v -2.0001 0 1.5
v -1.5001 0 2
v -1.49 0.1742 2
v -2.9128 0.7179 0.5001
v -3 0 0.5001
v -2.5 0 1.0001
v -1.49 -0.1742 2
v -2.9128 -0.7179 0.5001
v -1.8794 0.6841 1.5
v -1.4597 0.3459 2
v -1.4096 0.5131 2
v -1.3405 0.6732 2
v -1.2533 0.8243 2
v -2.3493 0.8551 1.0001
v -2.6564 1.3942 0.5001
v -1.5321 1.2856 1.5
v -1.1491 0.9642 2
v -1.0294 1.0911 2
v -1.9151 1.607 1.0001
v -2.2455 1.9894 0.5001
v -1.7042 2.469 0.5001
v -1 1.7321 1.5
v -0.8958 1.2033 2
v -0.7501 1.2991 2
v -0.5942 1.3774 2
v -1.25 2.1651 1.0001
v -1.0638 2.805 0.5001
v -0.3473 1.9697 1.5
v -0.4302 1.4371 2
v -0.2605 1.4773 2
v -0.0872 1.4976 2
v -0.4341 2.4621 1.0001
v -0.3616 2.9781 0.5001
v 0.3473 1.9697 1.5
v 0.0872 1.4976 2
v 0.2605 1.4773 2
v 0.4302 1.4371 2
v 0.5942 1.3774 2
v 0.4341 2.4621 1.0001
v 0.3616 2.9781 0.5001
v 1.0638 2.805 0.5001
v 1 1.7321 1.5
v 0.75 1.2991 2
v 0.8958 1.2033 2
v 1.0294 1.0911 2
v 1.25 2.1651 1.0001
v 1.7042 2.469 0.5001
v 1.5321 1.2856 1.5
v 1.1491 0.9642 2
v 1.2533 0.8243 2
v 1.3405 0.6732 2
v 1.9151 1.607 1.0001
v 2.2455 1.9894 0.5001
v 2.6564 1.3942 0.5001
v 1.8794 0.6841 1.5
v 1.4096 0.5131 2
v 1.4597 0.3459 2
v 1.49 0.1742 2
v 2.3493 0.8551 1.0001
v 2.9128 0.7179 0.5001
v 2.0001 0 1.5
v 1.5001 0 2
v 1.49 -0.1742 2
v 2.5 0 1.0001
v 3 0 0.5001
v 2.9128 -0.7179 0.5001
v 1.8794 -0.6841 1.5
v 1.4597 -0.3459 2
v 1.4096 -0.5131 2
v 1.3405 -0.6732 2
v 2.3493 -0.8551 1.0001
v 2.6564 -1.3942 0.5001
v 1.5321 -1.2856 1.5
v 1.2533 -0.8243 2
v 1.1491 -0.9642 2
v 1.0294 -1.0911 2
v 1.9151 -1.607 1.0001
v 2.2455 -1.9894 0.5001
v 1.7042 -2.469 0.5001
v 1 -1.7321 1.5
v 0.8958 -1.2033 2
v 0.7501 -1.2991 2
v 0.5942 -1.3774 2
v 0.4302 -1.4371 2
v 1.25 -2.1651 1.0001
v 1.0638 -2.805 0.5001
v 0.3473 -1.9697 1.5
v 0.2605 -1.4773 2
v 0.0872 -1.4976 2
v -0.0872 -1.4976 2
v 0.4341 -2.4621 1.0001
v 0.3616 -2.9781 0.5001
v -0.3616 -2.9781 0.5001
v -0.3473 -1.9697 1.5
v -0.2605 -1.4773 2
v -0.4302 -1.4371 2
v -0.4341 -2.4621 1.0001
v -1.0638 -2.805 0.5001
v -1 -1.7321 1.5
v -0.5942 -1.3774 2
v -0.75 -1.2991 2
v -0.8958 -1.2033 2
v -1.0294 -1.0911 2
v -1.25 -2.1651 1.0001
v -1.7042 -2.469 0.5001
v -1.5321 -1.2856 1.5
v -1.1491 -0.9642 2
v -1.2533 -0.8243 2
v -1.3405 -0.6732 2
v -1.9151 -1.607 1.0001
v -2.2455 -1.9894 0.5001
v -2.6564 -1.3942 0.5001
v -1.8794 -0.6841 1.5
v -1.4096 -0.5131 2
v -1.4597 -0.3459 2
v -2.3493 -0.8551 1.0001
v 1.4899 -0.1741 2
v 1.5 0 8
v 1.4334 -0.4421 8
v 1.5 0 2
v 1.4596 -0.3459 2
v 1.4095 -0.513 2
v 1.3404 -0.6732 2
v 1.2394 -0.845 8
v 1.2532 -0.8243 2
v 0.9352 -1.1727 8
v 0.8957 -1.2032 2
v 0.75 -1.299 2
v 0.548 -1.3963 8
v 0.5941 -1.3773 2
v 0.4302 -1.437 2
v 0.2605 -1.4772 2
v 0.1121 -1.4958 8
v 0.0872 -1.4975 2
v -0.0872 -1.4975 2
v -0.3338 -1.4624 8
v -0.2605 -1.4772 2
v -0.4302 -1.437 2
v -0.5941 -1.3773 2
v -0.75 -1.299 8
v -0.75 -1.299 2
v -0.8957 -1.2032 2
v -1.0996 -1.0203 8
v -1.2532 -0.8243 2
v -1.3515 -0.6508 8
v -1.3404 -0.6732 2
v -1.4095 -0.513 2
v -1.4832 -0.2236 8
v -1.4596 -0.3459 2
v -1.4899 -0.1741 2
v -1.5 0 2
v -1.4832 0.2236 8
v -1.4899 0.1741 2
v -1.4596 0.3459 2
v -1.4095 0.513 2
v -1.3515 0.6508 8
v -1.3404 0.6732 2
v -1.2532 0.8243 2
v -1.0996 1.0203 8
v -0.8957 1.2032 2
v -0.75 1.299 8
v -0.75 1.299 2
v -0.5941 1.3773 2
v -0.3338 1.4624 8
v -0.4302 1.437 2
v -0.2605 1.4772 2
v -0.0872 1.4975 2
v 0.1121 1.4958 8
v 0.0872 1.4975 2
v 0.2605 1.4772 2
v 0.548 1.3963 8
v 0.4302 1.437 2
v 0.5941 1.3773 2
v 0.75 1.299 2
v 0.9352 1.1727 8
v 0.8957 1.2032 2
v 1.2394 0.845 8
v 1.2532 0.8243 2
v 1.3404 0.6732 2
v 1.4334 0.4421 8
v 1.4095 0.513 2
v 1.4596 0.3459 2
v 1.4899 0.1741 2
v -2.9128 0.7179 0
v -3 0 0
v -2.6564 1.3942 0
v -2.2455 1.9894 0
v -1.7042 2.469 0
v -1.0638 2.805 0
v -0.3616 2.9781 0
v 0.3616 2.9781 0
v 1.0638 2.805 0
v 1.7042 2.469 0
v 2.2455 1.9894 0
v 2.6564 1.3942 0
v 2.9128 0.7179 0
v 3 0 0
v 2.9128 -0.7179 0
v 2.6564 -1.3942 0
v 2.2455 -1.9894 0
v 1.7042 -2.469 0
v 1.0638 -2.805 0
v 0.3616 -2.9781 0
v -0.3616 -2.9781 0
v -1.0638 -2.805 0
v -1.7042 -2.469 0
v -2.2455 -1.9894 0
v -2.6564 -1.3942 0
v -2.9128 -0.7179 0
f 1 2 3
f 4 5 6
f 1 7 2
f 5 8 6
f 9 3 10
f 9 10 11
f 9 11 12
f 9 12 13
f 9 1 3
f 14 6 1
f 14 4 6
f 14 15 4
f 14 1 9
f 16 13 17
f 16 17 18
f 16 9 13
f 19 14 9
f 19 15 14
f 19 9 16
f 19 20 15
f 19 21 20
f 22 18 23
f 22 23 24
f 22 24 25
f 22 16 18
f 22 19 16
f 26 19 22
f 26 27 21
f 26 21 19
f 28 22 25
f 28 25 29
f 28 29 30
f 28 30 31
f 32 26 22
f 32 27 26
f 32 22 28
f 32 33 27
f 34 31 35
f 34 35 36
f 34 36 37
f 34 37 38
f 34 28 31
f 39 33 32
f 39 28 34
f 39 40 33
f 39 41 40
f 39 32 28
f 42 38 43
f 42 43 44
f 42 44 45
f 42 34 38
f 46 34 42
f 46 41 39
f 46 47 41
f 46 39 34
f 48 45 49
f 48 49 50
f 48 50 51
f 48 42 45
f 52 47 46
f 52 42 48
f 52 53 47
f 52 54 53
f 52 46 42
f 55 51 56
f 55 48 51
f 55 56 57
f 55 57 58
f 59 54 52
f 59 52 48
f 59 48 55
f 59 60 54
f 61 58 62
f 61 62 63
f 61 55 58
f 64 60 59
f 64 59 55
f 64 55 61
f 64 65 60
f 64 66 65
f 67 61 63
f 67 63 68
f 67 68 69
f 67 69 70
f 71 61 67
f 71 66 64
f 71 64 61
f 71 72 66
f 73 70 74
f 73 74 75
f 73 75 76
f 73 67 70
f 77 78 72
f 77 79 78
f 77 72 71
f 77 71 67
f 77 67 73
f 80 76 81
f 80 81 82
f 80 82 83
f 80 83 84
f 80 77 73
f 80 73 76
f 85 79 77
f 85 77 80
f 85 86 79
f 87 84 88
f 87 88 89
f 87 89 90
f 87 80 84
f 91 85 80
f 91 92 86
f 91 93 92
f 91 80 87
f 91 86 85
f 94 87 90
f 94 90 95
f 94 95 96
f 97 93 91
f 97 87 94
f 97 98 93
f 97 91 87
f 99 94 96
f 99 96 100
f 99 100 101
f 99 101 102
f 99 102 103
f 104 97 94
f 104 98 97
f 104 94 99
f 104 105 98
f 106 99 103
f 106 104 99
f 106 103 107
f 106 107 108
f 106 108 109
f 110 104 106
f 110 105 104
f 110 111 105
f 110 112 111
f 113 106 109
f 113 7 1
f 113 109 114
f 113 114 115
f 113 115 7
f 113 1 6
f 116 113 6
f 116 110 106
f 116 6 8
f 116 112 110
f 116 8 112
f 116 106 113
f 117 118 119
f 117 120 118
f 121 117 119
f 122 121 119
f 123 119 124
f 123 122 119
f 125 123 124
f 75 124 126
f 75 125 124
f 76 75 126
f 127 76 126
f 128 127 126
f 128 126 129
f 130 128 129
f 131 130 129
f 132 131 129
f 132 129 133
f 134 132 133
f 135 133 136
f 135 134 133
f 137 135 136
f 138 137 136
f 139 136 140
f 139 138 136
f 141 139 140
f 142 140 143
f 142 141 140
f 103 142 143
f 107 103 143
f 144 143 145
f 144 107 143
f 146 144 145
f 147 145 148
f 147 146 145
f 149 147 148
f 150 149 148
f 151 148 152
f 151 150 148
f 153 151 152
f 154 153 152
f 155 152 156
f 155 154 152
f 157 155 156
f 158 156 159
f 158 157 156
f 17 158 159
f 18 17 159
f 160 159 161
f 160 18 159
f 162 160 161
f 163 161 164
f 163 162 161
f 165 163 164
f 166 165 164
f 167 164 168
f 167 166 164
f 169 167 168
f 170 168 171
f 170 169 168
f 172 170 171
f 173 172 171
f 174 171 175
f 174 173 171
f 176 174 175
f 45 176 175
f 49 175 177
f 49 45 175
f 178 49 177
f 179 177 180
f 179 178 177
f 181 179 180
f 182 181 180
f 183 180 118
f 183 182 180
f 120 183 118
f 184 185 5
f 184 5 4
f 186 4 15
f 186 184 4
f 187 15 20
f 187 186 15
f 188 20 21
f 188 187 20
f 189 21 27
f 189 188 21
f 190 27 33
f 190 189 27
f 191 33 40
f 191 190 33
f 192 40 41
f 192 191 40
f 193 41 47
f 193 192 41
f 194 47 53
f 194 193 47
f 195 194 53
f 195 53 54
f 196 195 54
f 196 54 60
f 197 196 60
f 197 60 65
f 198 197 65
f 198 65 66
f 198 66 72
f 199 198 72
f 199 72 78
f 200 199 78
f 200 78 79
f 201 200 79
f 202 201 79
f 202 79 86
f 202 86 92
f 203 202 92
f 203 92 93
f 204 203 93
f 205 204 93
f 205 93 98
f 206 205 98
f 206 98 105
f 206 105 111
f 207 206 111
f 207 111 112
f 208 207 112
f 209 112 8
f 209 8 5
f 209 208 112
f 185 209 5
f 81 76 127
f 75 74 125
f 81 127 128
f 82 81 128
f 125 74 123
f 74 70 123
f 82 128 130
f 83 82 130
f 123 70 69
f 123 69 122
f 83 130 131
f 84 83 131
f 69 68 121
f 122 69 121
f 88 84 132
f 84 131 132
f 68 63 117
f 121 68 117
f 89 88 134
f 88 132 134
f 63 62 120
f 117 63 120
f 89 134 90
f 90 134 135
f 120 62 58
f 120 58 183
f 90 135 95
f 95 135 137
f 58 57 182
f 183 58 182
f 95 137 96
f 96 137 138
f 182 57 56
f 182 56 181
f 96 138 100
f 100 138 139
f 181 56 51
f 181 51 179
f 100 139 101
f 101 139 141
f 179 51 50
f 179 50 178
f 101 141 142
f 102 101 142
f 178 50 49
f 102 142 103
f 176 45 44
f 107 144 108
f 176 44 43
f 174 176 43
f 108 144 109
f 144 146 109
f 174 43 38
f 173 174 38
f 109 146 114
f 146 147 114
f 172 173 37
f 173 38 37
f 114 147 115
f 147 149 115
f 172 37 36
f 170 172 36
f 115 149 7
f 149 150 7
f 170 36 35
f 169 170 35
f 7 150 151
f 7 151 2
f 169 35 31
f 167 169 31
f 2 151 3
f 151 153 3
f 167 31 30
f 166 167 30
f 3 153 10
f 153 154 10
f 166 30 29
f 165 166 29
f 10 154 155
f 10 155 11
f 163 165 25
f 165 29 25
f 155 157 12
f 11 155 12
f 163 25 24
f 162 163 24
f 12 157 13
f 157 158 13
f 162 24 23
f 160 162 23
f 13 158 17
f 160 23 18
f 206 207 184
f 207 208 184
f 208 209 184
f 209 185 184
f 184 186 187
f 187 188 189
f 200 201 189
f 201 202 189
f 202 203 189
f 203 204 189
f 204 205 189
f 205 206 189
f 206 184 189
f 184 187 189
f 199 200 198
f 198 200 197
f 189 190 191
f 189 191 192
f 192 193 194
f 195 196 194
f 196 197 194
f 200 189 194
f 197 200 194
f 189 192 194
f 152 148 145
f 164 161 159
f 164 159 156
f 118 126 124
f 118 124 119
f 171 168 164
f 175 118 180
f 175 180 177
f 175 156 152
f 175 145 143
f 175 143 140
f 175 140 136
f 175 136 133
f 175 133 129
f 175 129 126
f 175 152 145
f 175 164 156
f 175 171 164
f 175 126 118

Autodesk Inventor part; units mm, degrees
ref_plane "YZ Plane" through (0, 0, 0) normal (1, 0, 0) x (0, 1, 0)
ref_plane "XZ Plane" through (0, 0, 0) normal (0, 1, 0) x (-1, 0, 0)
ref_plane "XY Plane" through (0, 0, 0) normal (0, 0, 1) x (1, 0, 0)
sketch "スケッチ1" plane through (0, 0, 0) normal (0, 0, 1) x (1, 0, 0)
  circle A0 centre (0, 0) radius 1.5
  dimension "d0" = 3
extrude "押し出し1" add sketch "スケッチ1" along normal blind 8
sketch "スケッチ2" plane through (0, 0, 0) normal (0, 0, -1) x (-1, 0, 0)
  circle A0 centre (0, 0) radius 3
  dimension "d3" = 6
extrude "押し出し2" add sketch "スケッチ2" against normal blind 2
thread "ねじ1" size "M3x0.5" class "6g" standard "ANSI Metric M Profile" full length
chamfer "面取り1" distance 1.5 angle 45 1 edges at (3, 0, 2)
properties part number "ネジ皿m3,08" material "鋼、高強度、低合金"
